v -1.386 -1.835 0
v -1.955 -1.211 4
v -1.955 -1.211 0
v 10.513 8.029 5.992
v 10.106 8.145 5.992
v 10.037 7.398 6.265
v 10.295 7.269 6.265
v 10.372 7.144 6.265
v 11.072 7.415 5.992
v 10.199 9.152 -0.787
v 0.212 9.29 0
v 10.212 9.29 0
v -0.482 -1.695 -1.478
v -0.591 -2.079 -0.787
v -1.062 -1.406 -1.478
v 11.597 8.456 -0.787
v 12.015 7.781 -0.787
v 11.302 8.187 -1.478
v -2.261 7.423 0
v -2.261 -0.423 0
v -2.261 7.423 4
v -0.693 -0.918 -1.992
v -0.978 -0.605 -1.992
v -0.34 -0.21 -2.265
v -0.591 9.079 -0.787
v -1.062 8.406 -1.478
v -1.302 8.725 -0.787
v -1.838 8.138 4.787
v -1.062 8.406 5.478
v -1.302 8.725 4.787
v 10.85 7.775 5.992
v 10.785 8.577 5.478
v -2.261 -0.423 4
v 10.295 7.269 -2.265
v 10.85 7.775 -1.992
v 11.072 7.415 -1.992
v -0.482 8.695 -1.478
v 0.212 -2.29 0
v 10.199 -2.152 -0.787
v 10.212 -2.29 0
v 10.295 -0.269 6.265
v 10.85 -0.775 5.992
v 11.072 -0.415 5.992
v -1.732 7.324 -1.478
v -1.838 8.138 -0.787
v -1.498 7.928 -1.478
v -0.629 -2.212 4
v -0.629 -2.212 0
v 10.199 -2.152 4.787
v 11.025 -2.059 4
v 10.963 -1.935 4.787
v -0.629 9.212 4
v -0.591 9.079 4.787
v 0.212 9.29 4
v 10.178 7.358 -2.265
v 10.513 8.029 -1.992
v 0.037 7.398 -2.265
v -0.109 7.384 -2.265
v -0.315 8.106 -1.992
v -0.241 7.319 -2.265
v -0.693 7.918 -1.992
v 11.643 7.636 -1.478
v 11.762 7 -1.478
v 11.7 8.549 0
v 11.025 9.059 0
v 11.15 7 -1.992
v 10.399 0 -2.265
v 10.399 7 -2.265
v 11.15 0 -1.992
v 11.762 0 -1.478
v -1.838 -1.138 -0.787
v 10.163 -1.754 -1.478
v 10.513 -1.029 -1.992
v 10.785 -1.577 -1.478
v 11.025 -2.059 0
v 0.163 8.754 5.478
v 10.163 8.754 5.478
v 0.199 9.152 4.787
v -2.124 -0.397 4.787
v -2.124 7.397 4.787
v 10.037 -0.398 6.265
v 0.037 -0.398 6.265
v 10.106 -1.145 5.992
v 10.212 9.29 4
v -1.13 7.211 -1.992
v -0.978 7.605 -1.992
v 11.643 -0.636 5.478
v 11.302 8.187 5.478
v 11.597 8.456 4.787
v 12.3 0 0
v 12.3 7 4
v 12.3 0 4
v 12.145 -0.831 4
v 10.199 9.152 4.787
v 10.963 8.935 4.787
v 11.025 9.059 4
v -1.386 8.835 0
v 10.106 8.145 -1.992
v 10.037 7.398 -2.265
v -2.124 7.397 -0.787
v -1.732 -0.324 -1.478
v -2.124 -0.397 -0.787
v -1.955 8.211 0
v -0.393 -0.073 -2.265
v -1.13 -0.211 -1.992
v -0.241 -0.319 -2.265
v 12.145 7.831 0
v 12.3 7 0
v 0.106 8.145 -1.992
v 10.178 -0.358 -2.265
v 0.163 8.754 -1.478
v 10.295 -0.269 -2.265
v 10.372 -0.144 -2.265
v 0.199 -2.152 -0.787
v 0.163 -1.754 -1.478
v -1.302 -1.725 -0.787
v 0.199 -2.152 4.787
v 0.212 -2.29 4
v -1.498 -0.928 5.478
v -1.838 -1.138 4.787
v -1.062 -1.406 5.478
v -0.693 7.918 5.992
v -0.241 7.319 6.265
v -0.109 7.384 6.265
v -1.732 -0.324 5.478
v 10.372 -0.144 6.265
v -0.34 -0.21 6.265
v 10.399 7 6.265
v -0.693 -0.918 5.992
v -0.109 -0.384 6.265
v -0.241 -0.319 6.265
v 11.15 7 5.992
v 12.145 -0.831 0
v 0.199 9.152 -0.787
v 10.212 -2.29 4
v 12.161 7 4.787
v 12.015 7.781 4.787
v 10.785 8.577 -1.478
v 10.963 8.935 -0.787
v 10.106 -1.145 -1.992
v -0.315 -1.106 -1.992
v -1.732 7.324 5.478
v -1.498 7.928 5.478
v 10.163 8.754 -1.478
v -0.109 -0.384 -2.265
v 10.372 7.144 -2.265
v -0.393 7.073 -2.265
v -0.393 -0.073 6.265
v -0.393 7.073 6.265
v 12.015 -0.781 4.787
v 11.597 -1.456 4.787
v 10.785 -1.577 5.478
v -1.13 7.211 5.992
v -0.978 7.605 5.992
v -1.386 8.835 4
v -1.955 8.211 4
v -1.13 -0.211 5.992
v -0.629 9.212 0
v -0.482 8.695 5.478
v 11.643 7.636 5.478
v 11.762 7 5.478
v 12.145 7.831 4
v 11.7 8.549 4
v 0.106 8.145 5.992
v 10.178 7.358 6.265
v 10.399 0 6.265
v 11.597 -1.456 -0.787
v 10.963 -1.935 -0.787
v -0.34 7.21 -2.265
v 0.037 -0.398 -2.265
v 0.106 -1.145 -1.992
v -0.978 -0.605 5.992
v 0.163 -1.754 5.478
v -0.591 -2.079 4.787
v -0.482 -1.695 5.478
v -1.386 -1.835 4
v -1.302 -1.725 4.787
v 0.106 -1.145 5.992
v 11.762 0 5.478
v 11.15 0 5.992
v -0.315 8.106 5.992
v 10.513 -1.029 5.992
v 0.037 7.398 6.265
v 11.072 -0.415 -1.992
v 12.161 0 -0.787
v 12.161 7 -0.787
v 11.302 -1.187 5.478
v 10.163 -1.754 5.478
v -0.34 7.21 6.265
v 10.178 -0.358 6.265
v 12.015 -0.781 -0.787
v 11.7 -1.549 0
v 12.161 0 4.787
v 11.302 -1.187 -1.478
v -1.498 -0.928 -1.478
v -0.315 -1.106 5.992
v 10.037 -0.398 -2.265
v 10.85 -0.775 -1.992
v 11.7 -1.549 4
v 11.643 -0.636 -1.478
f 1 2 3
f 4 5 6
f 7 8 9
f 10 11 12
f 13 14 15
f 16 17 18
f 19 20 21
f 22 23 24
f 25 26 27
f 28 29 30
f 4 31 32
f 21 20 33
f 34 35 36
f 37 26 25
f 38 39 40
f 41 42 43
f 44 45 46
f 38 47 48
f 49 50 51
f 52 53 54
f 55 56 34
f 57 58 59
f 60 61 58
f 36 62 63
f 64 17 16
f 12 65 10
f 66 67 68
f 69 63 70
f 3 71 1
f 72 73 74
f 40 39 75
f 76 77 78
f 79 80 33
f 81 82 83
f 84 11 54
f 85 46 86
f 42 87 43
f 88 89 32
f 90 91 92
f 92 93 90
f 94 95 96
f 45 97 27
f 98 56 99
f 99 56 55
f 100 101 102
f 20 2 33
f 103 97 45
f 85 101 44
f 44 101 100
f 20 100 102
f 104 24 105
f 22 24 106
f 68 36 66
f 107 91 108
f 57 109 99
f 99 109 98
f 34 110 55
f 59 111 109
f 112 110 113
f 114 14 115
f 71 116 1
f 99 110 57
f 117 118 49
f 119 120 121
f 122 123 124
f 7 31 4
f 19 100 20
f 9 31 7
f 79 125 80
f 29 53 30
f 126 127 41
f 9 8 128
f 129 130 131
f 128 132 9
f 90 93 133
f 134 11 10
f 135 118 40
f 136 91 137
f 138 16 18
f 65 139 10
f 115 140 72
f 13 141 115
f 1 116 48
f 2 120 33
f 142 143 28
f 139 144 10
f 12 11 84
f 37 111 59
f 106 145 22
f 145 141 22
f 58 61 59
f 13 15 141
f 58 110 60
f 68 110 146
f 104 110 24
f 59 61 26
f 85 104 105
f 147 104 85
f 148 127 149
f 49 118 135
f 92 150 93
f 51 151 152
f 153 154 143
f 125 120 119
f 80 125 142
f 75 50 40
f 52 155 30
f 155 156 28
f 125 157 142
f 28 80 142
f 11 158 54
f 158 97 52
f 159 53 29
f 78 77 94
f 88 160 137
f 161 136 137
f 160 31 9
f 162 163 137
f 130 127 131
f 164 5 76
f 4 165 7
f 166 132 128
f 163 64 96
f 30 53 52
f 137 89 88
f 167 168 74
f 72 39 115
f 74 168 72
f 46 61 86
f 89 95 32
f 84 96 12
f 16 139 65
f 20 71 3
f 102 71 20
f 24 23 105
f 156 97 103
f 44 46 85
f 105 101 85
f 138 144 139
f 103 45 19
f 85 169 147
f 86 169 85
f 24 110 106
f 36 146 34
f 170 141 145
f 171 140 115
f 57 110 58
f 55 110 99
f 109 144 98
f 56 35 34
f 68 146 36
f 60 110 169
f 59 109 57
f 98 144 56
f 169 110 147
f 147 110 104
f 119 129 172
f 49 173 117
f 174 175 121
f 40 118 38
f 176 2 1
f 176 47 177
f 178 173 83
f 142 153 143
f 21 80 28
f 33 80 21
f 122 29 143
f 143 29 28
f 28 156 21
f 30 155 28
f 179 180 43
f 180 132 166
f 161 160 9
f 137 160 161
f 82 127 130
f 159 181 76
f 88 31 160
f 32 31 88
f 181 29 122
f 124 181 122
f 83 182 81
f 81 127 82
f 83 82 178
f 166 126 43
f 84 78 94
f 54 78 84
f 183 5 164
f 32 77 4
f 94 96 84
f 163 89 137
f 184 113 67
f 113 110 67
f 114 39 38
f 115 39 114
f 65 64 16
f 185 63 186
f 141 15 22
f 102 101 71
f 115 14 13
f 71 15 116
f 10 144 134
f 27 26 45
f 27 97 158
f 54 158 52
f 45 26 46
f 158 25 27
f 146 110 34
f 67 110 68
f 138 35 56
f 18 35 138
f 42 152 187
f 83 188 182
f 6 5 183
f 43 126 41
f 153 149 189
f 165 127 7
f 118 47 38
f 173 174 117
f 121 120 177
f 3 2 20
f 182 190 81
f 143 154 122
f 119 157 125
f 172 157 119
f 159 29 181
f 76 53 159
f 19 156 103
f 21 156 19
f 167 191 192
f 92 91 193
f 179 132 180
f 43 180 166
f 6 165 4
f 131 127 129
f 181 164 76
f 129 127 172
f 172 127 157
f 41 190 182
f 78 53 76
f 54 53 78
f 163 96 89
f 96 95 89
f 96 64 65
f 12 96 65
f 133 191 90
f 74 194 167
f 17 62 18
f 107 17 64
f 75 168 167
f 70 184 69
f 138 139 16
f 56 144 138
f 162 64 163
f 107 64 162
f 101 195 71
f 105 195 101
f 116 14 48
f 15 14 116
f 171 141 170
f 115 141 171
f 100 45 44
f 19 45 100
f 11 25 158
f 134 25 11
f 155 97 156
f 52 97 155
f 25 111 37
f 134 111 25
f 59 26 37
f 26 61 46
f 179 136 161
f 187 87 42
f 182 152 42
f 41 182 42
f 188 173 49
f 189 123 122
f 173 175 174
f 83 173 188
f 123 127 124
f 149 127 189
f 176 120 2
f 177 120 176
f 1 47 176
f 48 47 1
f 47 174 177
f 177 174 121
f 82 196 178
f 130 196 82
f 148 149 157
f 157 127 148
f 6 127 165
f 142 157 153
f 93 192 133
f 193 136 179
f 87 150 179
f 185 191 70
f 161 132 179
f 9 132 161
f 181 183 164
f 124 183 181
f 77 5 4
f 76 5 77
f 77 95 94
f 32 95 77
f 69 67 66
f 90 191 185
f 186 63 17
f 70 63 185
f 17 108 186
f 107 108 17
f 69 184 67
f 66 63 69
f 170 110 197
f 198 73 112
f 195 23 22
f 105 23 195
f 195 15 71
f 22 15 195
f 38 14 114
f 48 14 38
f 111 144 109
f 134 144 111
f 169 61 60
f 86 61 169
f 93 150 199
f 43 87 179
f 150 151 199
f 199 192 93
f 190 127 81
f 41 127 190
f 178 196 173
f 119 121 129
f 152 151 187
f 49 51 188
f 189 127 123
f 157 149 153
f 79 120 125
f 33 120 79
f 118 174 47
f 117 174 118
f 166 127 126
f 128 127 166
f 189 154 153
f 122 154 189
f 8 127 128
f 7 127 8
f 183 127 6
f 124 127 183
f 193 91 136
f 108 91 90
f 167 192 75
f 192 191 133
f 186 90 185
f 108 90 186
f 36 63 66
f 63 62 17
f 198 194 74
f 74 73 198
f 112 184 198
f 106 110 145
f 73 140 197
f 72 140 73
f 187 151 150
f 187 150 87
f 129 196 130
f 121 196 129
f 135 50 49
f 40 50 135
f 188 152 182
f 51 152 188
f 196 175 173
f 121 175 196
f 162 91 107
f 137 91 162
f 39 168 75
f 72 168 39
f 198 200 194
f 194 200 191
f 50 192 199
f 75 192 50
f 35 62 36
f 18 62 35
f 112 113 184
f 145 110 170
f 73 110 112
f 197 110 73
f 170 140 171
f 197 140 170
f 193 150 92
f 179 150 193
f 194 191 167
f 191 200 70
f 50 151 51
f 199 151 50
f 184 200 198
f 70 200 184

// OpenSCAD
minkowski() { cube([10, 7, 4]); sphere(r = 2.3, $fn = 17); }
